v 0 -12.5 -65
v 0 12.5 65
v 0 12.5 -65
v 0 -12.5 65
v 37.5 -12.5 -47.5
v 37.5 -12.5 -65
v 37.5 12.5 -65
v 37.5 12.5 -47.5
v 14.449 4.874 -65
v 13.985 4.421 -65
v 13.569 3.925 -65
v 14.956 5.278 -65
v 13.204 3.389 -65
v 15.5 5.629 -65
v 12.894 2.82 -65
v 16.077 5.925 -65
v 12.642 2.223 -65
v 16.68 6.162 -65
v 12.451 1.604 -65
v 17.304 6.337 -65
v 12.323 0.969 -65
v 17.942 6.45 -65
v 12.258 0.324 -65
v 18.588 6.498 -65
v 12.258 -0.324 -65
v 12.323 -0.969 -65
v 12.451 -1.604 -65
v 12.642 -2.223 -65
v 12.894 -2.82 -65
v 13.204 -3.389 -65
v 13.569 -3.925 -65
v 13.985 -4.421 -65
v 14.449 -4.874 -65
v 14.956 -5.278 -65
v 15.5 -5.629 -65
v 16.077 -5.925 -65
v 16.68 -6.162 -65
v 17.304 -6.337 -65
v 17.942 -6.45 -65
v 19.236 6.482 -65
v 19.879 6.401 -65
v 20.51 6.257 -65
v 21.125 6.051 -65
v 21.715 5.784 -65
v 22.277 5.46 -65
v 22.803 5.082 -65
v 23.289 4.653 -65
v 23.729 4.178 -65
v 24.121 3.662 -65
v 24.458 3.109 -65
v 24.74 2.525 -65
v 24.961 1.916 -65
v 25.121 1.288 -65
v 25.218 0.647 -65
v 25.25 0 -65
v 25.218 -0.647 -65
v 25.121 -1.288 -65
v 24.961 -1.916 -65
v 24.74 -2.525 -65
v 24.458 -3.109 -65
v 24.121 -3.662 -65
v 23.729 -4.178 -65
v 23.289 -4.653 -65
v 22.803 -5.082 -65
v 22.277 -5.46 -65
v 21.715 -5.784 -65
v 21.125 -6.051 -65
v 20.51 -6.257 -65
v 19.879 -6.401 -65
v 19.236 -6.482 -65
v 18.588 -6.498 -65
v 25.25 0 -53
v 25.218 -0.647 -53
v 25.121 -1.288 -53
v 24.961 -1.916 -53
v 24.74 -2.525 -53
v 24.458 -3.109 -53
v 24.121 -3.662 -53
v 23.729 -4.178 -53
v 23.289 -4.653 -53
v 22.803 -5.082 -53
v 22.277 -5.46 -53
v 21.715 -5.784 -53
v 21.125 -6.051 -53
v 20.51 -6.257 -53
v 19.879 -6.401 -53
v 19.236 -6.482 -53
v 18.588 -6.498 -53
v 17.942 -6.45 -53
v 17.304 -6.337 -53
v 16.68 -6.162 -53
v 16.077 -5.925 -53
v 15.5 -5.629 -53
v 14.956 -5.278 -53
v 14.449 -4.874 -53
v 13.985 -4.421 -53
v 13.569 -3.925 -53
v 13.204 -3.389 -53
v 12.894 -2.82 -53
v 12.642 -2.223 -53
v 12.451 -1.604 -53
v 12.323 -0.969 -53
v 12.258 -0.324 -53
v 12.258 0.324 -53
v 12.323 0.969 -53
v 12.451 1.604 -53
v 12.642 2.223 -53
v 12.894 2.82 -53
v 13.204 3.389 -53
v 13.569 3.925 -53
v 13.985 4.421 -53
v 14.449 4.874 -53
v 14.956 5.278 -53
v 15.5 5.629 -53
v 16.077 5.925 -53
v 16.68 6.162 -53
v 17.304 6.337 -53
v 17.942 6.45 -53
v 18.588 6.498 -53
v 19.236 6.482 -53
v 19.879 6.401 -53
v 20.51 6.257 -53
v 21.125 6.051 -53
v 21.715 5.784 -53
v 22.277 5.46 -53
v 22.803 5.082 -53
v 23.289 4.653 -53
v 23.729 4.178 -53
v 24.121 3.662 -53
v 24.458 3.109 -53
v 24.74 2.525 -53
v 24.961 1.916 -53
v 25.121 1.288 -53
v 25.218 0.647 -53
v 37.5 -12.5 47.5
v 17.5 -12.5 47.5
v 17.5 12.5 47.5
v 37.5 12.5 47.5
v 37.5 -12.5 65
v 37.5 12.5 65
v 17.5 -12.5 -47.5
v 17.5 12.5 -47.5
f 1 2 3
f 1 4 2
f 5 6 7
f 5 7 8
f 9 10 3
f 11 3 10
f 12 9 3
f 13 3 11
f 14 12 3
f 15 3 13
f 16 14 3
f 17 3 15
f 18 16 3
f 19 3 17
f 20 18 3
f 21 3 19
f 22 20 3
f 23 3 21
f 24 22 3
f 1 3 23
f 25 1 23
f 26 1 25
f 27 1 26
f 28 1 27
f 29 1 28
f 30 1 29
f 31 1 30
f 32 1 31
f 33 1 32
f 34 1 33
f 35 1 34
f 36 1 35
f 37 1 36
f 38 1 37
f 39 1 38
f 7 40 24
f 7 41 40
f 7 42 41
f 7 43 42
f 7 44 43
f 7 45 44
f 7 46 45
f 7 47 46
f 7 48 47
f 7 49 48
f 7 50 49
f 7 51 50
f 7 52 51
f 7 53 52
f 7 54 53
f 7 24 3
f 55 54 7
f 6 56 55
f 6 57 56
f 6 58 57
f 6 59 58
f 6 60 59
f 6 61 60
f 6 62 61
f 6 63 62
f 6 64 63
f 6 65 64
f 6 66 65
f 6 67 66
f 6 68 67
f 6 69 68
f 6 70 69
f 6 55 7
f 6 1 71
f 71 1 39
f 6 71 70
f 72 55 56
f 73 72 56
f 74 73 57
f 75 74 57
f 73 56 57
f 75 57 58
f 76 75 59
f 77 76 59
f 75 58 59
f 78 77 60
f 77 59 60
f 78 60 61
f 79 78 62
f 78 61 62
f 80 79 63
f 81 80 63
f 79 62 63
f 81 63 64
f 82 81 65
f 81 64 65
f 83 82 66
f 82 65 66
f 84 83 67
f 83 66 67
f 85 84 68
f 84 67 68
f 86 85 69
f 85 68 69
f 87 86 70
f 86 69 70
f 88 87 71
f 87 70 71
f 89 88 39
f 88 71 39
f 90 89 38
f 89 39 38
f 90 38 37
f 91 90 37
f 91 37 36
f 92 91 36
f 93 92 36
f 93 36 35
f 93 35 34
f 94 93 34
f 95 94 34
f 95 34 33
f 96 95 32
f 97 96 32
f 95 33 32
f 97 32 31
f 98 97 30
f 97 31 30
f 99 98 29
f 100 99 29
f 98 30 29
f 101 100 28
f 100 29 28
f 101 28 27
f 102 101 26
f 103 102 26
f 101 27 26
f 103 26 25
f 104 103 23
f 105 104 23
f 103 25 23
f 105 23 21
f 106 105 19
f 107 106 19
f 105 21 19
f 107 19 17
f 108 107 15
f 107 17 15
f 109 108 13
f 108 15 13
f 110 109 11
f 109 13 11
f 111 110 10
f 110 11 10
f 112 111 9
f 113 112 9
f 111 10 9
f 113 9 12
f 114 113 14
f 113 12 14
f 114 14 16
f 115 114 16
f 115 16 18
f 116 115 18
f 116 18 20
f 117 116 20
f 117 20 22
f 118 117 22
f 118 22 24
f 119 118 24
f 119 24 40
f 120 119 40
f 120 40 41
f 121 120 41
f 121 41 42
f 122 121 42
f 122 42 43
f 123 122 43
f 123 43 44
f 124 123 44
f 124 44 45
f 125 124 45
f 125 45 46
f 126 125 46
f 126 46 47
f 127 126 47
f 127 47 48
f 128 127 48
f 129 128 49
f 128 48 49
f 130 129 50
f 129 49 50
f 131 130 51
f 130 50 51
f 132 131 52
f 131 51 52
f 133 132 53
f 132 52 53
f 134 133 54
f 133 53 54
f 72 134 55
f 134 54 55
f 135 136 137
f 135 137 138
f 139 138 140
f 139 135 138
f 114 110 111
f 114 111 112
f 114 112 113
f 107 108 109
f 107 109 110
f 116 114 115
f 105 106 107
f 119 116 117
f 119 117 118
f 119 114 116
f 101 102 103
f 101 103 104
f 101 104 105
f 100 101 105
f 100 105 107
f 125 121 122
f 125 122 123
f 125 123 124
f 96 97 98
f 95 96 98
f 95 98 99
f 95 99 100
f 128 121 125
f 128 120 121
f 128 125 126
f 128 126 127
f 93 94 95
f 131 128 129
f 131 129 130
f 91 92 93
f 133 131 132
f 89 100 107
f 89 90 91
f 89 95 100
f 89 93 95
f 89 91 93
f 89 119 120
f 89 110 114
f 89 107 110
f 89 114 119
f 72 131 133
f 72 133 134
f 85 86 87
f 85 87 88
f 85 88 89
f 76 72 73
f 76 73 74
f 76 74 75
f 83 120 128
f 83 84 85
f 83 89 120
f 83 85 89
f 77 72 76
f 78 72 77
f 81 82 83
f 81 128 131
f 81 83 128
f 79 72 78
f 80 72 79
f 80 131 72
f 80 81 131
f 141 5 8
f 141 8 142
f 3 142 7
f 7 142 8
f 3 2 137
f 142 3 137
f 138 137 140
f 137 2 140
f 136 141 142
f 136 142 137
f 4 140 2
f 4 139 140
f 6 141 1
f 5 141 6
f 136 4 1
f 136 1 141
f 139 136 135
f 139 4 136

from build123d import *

# Parameters (mm, degrees)
F1_DEPTH      = 12.5
F1_DEPTH_BACK = 12.5
F2_R          = 6.5
F3_DEPTH      = 12


with BuildPart() as f1:
    # F0 (on Front) → F1 (new body, two sides)
    with BuildSketch(Plane.XZ) as f1_sk:
        Polygon((0, 65), (0, 0), (0, -65), (37.5, -65), (37.5, -47.5), (17.5, -47.5), (17.5, 0), (17.5, 47.5), (37.5, 47.5), (37.5, 65), align=None)
    extrude(amount=F1_DEPTH)
    extrude(f1_sk.sketch, amount=-F1_DEPTH_BACK)

    # F2 (on face) → F3 (cut)
    with BuildSketch(Plane(origin=(0, 0, -65), x_dir=(1, 0, 0), z_dir=(0, 0, -1))):
        with Locations((18.75, 0)):
            Circle(F2_R)
    extrude(amount=-F3_DEPTH, mode=Mode.SUBTRACT)


solid = f1.part
